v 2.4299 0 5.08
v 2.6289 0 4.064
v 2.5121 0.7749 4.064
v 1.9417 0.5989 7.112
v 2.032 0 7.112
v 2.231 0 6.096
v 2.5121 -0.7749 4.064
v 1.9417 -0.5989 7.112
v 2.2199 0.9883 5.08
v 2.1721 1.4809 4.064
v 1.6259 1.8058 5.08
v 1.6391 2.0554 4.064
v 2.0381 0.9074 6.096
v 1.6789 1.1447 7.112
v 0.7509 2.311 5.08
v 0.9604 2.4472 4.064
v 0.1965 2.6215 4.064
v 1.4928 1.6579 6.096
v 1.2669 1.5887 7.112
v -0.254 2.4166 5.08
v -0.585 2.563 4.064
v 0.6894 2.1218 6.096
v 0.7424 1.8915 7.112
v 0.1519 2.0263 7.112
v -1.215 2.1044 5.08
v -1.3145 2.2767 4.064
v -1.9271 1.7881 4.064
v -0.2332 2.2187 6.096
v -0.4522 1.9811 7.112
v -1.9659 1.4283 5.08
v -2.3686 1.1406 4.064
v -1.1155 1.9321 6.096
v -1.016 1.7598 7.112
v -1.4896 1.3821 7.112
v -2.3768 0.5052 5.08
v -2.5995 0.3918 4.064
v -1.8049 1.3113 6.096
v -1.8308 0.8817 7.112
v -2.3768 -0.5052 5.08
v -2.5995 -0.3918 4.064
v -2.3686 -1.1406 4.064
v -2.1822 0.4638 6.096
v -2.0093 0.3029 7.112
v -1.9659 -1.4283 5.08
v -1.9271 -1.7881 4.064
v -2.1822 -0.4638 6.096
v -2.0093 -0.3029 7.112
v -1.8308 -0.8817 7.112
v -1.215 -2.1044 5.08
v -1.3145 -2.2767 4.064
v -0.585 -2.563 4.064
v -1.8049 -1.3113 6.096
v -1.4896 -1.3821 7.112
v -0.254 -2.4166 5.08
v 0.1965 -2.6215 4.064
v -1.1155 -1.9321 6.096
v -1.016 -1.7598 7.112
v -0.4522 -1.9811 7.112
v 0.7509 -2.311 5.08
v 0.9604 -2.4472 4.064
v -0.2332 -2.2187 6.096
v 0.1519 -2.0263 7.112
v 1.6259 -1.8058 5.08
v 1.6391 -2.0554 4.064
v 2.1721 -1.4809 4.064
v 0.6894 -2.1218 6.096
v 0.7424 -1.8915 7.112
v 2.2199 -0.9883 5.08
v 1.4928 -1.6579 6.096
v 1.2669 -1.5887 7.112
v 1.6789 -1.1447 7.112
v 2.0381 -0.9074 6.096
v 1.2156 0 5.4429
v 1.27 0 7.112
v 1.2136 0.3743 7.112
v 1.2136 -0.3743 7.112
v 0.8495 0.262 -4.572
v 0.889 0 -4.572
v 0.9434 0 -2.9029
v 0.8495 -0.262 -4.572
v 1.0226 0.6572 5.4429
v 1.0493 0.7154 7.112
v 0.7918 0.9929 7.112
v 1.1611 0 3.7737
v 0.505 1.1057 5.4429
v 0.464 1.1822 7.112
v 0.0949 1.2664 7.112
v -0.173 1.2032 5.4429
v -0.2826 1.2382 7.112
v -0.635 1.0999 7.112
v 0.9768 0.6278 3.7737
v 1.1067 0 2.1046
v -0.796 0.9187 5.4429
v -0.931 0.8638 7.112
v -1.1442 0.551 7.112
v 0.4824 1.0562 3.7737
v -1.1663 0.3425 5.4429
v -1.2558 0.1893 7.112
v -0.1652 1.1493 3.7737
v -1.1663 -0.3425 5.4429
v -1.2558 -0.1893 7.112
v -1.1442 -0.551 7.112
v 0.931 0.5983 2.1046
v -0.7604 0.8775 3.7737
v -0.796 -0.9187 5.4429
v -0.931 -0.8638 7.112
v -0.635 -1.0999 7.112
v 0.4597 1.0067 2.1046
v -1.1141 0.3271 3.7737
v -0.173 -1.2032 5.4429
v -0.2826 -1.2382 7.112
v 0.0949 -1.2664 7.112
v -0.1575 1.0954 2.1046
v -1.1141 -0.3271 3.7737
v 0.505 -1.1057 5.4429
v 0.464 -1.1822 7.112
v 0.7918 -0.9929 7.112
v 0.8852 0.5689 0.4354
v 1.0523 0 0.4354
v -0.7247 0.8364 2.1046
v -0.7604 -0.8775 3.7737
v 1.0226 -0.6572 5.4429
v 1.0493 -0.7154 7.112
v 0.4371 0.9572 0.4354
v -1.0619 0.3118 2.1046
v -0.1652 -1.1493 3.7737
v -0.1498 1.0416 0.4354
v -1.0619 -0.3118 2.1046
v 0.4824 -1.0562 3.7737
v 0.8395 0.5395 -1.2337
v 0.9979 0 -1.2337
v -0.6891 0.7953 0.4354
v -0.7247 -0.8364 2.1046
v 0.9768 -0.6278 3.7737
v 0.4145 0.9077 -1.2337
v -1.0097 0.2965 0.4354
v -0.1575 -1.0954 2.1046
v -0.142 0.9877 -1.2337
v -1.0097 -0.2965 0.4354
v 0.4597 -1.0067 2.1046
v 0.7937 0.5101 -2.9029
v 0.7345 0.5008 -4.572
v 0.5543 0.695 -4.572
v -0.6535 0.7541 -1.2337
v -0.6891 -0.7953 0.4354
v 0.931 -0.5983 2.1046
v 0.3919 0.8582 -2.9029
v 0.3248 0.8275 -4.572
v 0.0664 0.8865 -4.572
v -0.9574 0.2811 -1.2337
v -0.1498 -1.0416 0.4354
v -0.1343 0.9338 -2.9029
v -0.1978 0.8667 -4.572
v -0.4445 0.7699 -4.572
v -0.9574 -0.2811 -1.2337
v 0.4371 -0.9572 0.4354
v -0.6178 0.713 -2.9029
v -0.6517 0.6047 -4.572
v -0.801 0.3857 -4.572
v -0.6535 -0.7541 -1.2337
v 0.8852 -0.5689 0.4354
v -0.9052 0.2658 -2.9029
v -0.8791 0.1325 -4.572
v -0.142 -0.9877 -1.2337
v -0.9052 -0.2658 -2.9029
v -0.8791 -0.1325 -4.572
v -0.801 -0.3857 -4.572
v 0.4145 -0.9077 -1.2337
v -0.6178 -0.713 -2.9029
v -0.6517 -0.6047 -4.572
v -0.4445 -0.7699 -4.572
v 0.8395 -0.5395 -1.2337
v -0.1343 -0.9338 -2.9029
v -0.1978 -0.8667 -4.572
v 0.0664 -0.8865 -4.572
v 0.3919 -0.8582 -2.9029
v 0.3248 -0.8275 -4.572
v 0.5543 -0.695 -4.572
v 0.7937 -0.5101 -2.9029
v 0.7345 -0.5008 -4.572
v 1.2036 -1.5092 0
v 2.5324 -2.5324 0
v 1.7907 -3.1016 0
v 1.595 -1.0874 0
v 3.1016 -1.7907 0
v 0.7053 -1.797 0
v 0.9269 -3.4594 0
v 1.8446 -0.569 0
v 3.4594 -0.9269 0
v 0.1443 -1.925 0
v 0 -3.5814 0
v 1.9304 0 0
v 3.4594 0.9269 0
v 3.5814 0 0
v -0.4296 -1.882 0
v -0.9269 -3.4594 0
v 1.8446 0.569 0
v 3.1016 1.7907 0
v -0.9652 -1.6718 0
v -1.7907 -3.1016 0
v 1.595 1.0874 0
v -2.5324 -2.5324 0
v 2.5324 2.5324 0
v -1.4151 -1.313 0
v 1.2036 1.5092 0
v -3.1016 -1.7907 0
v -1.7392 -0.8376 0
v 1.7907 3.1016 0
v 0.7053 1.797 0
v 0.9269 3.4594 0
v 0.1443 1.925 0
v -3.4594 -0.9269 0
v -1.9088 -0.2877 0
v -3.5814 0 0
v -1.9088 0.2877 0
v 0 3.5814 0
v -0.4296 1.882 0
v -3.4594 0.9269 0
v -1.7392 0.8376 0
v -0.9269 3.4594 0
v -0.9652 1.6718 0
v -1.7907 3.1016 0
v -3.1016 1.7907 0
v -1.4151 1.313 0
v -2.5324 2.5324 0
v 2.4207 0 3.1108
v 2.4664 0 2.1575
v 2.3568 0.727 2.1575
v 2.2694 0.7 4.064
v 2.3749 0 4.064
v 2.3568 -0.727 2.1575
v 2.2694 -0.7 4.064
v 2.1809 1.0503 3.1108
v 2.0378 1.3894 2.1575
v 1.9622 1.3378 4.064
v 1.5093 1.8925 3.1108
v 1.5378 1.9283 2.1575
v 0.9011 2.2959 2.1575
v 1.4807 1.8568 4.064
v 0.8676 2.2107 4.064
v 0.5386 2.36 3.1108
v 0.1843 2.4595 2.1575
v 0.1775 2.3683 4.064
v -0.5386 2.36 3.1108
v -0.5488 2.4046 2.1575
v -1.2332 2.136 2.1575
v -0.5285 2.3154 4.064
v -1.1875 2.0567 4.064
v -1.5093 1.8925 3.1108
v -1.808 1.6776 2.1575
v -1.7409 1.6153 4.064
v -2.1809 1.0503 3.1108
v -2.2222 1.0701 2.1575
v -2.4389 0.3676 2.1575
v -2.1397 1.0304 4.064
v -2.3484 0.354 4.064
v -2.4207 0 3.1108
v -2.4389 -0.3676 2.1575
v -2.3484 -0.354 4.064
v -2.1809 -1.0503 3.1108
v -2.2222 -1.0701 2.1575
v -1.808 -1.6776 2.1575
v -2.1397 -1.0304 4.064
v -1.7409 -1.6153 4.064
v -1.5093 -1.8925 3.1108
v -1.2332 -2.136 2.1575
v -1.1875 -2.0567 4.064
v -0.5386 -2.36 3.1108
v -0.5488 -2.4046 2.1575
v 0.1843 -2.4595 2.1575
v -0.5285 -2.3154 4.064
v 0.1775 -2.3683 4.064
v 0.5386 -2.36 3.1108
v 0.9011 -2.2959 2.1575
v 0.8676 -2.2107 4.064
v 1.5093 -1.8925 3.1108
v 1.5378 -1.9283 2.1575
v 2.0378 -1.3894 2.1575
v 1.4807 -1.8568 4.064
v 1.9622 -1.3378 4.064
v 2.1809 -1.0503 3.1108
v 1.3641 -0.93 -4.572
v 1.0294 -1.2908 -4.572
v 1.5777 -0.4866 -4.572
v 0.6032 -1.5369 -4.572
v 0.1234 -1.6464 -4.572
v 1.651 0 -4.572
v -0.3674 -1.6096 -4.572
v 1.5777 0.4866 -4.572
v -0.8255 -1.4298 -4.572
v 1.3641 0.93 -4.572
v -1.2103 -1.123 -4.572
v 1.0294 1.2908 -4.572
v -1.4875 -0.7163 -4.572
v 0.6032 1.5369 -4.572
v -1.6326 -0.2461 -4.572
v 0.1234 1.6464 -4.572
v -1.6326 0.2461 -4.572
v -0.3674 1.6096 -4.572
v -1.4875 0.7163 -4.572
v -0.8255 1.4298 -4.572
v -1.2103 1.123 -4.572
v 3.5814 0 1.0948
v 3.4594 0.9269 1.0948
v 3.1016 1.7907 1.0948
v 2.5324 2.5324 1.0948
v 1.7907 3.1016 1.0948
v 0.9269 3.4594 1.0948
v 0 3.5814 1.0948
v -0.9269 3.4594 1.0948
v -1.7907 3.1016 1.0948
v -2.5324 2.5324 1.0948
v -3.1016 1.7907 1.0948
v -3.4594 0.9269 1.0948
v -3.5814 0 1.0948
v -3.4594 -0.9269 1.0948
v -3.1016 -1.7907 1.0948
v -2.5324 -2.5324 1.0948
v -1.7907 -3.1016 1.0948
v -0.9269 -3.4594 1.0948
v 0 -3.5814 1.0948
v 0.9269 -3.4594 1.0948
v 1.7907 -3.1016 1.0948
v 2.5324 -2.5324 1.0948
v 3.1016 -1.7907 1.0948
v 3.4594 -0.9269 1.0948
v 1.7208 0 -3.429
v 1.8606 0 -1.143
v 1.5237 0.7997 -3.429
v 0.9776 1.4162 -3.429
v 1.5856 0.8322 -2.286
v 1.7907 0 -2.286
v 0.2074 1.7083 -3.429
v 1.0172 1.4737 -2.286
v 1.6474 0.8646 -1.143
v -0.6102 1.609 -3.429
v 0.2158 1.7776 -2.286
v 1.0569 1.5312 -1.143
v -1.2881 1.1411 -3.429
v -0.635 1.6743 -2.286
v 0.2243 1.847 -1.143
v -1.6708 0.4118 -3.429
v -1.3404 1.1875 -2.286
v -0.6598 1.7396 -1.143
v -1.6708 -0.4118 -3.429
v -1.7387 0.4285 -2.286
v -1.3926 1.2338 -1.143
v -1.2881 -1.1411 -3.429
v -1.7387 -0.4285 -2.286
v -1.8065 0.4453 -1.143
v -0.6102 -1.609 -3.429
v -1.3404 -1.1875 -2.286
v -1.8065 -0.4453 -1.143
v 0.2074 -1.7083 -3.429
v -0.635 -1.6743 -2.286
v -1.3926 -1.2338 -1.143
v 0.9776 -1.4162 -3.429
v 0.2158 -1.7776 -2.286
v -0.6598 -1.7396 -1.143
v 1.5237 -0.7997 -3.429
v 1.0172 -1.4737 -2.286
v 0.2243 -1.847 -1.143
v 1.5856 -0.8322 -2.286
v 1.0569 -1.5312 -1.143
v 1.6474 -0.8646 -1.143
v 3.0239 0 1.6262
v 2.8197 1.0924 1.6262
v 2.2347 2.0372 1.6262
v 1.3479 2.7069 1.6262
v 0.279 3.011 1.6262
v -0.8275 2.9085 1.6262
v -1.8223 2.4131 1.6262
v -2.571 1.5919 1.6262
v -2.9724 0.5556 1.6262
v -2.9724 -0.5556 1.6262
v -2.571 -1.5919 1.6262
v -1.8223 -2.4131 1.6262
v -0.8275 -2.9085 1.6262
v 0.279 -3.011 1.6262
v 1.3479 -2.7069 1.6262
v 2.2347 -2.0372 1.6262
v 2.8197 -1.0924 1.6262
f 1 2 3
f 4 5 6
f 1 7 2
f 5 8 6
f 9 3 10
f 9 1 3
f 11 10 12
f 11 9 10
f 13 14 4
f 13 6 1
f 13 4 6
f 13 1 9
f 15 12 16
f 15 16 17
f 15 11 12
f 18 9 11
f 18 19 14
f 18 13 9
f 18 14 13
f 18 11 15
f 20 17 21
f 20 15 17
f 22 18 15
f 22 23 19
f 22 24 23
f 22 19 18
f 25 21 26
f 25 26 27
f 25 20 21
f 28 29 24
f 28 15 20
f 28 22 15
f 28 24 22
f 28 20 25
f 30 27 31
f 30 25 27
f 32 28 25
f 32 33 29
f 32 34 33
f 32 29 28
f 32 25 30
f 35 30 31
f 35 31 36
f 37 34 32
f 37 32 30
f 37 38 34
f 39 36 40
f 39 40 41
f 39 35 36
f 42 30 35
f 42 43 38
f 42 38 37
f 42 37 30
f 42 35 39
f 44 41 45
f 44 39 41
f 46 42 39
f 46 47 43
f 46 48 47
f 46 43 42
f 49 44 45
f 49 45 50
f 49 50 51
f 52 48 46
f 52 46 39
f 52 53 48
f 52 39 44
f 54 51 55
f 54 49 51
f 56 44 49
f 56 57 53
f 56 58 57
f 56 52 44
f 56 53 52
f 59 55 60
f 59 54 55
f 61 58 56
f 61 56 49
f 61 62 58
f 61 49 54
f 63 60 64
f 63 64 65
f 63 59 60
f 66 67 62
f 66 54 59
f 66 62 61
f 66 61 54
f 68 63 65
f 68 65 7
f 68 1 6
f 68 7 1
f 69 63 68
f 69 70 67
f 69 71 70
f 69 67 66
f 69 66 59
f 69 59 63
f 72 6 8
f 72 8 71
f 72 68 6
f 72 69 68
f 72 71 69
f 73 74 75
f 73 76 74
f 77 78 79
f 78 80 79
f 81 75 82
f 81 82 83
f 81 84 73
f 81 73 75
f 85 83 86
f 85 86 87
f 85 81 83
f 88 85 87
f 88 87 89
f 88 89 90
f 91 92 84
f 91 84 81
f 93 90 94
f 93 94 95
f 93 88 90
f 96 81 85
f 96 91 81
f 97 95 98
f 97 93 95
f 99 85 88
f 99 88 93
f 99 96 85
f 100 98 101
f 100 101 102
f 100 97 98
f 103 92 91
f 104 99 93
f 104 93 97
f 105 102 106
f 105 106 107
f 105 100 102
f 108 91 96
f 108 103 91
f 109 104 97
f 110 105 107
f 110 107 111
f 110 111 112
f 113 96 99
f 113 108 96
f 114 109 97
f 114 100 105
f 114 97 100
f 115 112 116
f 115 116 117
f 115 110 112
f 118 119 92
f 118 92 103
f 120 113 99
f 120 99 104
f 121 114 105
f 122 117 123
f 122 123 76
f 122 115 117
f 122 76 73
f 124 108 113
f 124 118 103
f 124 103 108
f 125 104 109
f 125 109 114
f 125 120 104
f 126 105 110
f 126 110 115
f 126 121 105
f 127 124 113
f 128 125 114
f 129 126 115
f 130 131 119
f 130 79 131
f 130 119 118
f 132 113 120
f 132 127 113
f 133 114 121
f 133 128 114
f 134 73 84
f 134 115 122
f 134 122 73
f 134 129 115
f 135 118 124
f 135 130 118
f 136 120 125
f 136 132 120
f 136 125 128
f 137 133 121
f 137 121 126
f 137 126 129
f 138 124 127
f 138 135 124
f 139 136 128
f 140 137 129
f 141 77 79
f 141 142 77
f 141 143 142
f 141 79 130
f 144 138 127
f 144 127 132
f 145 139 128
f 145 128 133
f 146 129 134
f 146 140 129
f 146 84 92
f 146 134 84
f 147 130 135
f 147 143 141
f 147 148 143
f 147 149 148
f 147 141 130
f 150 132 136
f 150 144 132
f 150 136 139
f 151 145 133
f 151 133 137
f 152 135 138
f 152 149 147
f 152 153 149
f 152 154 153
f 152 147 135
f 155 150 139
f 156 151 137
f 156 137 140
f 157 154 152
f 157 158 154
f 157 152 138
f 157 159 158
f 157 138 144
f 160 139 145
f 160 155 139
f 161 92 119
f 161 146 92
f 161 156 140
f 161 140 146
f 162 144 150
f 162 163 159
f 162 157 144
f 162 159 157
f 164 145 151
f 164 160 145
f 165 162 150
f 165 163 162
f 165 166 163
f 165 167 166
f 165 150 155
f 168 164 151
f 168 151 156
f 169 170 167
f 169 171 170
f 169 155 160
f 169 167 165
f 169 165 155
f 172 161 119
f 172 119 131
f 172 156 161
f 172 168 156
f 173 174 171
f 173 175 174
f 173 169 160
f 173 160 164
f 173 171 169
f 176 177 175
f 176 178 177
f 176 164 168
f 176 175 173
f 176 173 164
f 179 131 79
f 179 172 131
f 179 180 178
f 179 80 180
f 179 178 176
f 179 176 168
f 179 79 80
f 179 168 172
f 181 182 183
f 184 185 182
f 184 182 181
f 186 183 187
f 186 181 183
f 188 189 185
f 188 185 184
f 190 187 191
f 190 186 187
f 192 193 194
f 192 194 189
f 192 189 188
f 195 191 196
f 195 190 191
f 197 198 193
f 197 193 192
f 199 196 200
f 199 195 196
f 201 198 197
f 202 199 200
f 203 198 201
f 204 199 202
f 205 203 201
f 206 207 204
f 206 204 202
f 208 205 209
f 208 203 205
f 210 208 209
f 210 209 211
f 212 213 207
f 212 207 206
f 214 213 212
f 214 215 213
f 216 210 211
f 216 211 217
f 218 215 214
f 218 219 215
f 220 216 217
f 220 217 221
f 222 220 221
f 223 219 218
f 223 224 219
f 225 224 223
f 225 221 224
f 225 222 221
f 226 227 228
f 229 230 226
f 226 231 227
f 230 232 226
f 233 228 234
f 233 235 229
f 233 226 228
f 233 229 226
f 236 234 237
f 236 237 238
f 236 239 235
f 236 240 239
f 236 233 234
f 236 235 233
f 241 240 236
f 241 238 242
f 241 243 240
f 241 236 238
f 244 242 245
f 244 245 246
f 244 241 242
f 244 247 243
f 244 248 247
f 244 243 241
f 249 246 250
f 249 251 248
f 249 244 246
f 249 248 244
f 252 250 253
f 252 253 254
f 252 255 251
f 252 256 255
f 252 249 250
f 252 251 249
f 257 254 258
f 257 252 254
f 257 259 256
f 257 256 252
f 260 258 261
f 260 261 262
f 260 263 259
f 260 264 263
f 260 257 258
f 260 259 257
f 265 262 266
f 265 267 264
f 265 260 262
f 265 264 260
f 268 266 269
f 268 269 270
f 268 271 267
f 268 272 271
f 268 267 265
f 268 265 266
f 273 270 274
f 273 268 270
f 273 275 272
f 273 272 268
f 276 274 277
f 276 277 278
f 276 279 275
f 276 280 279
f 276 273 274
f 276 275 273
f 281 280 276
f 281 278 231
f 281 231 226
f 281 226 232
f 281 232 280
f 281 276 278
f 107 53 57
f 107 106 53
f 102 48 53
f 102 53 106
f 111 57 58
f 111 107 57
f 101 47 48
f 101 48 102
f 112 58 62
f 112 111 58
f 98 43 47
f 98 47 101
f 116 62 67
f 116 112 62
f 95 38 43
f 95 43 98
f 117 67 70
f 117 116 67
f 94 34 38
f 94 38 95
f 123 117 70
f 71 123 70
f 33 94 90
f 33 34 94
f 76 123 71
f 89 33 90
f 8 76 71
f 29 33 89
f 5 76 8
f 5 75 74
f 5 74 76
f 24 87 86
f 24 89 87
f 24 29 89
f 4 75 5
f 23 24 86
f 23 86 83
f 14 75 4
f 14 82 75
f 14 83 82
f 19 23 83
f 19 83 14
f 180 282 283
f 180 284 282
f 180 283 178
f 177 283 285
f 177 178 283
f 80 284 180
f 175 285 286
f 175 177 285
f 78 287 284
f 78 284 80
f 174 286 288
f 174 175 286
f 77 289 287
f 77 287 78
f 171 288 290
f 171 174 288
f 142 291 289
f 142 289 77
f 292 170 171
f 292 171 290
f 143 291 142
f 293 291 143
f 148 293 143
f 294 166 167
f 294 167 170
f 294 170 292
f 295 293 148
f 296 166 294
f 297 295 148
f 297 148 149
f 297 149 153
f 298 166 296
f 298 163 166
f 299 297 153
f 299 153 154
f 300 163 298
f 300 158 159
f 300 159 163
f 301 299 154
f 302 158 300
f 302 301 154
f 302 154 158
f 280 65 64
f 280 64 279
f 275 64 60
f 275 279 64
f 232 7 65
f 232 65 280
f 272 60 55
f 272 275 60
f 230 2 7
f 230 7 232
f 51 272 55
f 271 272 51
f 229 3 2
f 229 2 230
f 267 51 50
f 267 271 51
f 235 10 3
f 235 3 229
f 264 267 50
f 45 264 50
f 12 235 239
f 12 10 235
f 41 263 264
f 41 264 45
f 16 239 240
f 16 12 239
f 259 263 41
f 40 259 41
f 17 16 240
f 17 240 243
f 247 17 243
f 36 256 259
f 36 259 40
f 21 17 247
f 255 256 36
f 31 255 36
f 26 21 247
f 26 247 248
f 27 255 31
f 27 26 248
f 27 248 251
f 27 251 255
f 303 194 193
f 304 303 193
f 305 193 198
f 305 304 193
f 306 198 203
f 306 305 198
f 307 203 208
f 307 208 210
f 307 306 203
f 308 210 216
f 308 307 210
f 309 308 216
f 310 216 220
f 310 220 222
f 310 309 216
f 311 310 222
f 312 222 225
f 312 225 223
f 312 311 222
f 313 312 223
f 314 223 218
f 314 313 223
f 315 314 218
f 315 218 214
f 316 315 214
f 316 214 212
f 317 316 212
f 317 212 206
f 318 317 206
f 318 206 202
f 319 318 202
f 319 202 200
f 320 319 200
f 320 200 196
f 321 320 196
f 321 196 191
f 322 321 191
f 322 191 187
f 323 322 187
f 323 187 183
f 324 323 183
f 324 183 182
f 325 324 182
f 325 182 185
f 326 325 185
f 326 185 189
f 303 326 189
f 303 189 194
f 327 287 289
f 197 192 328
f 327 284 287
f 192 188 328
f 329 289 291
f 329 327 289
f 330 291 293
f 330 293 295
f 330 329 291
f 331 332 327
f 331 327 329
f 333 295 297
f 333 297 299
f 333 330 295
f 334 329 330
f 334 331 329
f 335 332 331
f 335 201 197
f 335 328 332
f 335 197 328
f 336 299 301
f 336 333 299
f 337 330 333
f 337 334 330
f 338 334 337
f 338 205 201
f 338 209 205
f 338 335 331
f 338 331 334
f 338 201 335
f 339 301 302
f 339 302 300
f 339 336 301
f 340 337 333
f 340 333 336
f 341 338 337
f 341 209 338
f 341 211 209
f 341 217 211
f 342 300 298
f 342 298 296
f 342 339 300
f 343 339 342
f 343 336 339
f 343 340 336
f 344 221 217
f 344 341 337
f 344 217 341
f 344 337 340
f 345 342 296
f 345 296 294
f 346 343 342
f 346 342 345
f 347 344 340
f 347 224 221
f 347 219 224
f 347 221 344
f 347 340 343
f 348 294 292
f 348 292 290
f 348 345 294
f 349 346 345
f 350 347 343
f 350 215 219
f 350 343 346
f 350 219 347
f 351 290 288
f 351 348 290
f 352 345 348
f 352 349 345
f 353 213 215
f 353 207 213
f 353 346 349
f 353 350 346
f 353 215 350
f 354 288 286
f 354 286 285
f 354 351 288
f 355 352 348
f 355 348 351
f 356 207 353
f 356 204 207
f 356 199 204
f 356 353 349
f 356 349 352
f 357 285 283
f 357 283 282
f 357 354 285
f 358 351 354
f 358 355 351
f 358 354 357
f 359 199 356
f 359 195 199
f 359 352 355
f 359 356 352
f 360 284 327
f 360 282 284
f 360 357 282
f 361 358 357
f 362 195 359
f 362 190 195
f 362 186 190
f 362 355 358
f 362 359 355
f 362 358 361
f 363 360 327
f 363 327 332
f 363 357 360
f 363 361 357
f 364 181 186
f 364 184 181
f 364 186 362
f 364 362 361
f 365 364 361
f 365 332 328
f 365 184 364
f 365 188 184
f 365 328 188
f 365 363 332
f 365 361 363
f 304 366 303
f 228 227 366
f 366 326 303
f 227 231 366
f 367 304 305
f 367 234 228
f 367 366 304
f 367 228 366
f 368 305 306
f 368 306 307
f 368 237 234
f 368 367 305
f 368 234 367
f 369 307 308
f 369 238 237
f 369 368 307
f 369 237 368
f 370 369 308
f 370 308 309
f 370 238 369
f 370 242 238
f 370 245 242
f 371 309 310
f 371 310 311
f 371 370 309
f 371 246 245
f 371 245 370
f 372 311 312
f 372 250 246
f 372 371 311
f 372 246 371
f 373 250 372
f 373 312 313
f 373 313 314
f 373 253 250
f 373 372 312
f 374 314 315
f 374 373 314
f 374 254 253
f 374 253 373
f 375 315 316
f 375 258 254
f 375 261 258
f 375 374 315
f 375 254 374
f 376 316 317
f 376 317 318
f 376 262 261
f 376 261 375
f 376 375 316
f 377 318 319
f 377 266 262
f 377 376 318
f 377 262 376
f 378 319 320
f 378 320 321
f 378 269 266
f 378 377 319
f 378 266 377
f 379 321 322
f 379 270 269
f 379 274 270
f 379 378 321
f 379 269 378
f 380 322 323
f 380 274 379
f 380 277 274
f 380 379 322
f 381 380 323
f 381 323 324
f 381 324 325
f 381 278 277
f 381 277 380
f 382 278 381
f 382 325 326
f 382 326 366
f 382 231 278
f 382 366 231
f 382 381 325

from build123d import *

# Parameters (mm, degrees)
F2_S5_R     = 3.5814
F2_T6_DEPTH = 7


# Not quite as in the source:
# - a fillet or chamfer that OpenCascade refuses, or shapes differently, is made with other operations: its cross-section is extruded or revolved along the edge and cut away or added


with BuildPart() as f1:
    # F0 (on Front) → F1 (revolve)
    with BuildSketch(Plane.XZ):
        Polygon((0.889, -4.572), (1.651, -4.572), (1.9304, 0), (3.5814, 0), (3.5814, 0.889), (2.5273, 0.889), (2.3749, 4.064), (2.6289, 4.064), (2.032, 7.112), (1.27, 7.112), align=None)
    revolve(axis=Axis((0, 0, 1.778), (0, 0, 1)))

    # F2: chamfer of 1.27 on 1 edges, made by hand


with BuildPart() as f2_tool2:
    # F2_s3 → F2_t4 (revolve)
    with BuildSketch(Plane.XZ):
        Polygon((3.7973, 0.889), (2.4664101048, 2.1575394833), (2.5273, 0.889), align=None)
    revolve(axis=Axis((0, 0, 0.889), (0, 0, 1)))

    # F2_s5 → F2_t6 (intersect, symmetric)
    with BuildSketch(Plane.XY.offset(1.5)):
        Circle(F2_S5_R)
    extrude(amount=F2_T6_DEPTH, both=True, mode=Mode.INTERSECT)


with BuildPart() as f1_1:
    add(f1.part)

    # F2_t1: union F2_tool2
    add(f2_tool2.part)


solid = f1_1.part
